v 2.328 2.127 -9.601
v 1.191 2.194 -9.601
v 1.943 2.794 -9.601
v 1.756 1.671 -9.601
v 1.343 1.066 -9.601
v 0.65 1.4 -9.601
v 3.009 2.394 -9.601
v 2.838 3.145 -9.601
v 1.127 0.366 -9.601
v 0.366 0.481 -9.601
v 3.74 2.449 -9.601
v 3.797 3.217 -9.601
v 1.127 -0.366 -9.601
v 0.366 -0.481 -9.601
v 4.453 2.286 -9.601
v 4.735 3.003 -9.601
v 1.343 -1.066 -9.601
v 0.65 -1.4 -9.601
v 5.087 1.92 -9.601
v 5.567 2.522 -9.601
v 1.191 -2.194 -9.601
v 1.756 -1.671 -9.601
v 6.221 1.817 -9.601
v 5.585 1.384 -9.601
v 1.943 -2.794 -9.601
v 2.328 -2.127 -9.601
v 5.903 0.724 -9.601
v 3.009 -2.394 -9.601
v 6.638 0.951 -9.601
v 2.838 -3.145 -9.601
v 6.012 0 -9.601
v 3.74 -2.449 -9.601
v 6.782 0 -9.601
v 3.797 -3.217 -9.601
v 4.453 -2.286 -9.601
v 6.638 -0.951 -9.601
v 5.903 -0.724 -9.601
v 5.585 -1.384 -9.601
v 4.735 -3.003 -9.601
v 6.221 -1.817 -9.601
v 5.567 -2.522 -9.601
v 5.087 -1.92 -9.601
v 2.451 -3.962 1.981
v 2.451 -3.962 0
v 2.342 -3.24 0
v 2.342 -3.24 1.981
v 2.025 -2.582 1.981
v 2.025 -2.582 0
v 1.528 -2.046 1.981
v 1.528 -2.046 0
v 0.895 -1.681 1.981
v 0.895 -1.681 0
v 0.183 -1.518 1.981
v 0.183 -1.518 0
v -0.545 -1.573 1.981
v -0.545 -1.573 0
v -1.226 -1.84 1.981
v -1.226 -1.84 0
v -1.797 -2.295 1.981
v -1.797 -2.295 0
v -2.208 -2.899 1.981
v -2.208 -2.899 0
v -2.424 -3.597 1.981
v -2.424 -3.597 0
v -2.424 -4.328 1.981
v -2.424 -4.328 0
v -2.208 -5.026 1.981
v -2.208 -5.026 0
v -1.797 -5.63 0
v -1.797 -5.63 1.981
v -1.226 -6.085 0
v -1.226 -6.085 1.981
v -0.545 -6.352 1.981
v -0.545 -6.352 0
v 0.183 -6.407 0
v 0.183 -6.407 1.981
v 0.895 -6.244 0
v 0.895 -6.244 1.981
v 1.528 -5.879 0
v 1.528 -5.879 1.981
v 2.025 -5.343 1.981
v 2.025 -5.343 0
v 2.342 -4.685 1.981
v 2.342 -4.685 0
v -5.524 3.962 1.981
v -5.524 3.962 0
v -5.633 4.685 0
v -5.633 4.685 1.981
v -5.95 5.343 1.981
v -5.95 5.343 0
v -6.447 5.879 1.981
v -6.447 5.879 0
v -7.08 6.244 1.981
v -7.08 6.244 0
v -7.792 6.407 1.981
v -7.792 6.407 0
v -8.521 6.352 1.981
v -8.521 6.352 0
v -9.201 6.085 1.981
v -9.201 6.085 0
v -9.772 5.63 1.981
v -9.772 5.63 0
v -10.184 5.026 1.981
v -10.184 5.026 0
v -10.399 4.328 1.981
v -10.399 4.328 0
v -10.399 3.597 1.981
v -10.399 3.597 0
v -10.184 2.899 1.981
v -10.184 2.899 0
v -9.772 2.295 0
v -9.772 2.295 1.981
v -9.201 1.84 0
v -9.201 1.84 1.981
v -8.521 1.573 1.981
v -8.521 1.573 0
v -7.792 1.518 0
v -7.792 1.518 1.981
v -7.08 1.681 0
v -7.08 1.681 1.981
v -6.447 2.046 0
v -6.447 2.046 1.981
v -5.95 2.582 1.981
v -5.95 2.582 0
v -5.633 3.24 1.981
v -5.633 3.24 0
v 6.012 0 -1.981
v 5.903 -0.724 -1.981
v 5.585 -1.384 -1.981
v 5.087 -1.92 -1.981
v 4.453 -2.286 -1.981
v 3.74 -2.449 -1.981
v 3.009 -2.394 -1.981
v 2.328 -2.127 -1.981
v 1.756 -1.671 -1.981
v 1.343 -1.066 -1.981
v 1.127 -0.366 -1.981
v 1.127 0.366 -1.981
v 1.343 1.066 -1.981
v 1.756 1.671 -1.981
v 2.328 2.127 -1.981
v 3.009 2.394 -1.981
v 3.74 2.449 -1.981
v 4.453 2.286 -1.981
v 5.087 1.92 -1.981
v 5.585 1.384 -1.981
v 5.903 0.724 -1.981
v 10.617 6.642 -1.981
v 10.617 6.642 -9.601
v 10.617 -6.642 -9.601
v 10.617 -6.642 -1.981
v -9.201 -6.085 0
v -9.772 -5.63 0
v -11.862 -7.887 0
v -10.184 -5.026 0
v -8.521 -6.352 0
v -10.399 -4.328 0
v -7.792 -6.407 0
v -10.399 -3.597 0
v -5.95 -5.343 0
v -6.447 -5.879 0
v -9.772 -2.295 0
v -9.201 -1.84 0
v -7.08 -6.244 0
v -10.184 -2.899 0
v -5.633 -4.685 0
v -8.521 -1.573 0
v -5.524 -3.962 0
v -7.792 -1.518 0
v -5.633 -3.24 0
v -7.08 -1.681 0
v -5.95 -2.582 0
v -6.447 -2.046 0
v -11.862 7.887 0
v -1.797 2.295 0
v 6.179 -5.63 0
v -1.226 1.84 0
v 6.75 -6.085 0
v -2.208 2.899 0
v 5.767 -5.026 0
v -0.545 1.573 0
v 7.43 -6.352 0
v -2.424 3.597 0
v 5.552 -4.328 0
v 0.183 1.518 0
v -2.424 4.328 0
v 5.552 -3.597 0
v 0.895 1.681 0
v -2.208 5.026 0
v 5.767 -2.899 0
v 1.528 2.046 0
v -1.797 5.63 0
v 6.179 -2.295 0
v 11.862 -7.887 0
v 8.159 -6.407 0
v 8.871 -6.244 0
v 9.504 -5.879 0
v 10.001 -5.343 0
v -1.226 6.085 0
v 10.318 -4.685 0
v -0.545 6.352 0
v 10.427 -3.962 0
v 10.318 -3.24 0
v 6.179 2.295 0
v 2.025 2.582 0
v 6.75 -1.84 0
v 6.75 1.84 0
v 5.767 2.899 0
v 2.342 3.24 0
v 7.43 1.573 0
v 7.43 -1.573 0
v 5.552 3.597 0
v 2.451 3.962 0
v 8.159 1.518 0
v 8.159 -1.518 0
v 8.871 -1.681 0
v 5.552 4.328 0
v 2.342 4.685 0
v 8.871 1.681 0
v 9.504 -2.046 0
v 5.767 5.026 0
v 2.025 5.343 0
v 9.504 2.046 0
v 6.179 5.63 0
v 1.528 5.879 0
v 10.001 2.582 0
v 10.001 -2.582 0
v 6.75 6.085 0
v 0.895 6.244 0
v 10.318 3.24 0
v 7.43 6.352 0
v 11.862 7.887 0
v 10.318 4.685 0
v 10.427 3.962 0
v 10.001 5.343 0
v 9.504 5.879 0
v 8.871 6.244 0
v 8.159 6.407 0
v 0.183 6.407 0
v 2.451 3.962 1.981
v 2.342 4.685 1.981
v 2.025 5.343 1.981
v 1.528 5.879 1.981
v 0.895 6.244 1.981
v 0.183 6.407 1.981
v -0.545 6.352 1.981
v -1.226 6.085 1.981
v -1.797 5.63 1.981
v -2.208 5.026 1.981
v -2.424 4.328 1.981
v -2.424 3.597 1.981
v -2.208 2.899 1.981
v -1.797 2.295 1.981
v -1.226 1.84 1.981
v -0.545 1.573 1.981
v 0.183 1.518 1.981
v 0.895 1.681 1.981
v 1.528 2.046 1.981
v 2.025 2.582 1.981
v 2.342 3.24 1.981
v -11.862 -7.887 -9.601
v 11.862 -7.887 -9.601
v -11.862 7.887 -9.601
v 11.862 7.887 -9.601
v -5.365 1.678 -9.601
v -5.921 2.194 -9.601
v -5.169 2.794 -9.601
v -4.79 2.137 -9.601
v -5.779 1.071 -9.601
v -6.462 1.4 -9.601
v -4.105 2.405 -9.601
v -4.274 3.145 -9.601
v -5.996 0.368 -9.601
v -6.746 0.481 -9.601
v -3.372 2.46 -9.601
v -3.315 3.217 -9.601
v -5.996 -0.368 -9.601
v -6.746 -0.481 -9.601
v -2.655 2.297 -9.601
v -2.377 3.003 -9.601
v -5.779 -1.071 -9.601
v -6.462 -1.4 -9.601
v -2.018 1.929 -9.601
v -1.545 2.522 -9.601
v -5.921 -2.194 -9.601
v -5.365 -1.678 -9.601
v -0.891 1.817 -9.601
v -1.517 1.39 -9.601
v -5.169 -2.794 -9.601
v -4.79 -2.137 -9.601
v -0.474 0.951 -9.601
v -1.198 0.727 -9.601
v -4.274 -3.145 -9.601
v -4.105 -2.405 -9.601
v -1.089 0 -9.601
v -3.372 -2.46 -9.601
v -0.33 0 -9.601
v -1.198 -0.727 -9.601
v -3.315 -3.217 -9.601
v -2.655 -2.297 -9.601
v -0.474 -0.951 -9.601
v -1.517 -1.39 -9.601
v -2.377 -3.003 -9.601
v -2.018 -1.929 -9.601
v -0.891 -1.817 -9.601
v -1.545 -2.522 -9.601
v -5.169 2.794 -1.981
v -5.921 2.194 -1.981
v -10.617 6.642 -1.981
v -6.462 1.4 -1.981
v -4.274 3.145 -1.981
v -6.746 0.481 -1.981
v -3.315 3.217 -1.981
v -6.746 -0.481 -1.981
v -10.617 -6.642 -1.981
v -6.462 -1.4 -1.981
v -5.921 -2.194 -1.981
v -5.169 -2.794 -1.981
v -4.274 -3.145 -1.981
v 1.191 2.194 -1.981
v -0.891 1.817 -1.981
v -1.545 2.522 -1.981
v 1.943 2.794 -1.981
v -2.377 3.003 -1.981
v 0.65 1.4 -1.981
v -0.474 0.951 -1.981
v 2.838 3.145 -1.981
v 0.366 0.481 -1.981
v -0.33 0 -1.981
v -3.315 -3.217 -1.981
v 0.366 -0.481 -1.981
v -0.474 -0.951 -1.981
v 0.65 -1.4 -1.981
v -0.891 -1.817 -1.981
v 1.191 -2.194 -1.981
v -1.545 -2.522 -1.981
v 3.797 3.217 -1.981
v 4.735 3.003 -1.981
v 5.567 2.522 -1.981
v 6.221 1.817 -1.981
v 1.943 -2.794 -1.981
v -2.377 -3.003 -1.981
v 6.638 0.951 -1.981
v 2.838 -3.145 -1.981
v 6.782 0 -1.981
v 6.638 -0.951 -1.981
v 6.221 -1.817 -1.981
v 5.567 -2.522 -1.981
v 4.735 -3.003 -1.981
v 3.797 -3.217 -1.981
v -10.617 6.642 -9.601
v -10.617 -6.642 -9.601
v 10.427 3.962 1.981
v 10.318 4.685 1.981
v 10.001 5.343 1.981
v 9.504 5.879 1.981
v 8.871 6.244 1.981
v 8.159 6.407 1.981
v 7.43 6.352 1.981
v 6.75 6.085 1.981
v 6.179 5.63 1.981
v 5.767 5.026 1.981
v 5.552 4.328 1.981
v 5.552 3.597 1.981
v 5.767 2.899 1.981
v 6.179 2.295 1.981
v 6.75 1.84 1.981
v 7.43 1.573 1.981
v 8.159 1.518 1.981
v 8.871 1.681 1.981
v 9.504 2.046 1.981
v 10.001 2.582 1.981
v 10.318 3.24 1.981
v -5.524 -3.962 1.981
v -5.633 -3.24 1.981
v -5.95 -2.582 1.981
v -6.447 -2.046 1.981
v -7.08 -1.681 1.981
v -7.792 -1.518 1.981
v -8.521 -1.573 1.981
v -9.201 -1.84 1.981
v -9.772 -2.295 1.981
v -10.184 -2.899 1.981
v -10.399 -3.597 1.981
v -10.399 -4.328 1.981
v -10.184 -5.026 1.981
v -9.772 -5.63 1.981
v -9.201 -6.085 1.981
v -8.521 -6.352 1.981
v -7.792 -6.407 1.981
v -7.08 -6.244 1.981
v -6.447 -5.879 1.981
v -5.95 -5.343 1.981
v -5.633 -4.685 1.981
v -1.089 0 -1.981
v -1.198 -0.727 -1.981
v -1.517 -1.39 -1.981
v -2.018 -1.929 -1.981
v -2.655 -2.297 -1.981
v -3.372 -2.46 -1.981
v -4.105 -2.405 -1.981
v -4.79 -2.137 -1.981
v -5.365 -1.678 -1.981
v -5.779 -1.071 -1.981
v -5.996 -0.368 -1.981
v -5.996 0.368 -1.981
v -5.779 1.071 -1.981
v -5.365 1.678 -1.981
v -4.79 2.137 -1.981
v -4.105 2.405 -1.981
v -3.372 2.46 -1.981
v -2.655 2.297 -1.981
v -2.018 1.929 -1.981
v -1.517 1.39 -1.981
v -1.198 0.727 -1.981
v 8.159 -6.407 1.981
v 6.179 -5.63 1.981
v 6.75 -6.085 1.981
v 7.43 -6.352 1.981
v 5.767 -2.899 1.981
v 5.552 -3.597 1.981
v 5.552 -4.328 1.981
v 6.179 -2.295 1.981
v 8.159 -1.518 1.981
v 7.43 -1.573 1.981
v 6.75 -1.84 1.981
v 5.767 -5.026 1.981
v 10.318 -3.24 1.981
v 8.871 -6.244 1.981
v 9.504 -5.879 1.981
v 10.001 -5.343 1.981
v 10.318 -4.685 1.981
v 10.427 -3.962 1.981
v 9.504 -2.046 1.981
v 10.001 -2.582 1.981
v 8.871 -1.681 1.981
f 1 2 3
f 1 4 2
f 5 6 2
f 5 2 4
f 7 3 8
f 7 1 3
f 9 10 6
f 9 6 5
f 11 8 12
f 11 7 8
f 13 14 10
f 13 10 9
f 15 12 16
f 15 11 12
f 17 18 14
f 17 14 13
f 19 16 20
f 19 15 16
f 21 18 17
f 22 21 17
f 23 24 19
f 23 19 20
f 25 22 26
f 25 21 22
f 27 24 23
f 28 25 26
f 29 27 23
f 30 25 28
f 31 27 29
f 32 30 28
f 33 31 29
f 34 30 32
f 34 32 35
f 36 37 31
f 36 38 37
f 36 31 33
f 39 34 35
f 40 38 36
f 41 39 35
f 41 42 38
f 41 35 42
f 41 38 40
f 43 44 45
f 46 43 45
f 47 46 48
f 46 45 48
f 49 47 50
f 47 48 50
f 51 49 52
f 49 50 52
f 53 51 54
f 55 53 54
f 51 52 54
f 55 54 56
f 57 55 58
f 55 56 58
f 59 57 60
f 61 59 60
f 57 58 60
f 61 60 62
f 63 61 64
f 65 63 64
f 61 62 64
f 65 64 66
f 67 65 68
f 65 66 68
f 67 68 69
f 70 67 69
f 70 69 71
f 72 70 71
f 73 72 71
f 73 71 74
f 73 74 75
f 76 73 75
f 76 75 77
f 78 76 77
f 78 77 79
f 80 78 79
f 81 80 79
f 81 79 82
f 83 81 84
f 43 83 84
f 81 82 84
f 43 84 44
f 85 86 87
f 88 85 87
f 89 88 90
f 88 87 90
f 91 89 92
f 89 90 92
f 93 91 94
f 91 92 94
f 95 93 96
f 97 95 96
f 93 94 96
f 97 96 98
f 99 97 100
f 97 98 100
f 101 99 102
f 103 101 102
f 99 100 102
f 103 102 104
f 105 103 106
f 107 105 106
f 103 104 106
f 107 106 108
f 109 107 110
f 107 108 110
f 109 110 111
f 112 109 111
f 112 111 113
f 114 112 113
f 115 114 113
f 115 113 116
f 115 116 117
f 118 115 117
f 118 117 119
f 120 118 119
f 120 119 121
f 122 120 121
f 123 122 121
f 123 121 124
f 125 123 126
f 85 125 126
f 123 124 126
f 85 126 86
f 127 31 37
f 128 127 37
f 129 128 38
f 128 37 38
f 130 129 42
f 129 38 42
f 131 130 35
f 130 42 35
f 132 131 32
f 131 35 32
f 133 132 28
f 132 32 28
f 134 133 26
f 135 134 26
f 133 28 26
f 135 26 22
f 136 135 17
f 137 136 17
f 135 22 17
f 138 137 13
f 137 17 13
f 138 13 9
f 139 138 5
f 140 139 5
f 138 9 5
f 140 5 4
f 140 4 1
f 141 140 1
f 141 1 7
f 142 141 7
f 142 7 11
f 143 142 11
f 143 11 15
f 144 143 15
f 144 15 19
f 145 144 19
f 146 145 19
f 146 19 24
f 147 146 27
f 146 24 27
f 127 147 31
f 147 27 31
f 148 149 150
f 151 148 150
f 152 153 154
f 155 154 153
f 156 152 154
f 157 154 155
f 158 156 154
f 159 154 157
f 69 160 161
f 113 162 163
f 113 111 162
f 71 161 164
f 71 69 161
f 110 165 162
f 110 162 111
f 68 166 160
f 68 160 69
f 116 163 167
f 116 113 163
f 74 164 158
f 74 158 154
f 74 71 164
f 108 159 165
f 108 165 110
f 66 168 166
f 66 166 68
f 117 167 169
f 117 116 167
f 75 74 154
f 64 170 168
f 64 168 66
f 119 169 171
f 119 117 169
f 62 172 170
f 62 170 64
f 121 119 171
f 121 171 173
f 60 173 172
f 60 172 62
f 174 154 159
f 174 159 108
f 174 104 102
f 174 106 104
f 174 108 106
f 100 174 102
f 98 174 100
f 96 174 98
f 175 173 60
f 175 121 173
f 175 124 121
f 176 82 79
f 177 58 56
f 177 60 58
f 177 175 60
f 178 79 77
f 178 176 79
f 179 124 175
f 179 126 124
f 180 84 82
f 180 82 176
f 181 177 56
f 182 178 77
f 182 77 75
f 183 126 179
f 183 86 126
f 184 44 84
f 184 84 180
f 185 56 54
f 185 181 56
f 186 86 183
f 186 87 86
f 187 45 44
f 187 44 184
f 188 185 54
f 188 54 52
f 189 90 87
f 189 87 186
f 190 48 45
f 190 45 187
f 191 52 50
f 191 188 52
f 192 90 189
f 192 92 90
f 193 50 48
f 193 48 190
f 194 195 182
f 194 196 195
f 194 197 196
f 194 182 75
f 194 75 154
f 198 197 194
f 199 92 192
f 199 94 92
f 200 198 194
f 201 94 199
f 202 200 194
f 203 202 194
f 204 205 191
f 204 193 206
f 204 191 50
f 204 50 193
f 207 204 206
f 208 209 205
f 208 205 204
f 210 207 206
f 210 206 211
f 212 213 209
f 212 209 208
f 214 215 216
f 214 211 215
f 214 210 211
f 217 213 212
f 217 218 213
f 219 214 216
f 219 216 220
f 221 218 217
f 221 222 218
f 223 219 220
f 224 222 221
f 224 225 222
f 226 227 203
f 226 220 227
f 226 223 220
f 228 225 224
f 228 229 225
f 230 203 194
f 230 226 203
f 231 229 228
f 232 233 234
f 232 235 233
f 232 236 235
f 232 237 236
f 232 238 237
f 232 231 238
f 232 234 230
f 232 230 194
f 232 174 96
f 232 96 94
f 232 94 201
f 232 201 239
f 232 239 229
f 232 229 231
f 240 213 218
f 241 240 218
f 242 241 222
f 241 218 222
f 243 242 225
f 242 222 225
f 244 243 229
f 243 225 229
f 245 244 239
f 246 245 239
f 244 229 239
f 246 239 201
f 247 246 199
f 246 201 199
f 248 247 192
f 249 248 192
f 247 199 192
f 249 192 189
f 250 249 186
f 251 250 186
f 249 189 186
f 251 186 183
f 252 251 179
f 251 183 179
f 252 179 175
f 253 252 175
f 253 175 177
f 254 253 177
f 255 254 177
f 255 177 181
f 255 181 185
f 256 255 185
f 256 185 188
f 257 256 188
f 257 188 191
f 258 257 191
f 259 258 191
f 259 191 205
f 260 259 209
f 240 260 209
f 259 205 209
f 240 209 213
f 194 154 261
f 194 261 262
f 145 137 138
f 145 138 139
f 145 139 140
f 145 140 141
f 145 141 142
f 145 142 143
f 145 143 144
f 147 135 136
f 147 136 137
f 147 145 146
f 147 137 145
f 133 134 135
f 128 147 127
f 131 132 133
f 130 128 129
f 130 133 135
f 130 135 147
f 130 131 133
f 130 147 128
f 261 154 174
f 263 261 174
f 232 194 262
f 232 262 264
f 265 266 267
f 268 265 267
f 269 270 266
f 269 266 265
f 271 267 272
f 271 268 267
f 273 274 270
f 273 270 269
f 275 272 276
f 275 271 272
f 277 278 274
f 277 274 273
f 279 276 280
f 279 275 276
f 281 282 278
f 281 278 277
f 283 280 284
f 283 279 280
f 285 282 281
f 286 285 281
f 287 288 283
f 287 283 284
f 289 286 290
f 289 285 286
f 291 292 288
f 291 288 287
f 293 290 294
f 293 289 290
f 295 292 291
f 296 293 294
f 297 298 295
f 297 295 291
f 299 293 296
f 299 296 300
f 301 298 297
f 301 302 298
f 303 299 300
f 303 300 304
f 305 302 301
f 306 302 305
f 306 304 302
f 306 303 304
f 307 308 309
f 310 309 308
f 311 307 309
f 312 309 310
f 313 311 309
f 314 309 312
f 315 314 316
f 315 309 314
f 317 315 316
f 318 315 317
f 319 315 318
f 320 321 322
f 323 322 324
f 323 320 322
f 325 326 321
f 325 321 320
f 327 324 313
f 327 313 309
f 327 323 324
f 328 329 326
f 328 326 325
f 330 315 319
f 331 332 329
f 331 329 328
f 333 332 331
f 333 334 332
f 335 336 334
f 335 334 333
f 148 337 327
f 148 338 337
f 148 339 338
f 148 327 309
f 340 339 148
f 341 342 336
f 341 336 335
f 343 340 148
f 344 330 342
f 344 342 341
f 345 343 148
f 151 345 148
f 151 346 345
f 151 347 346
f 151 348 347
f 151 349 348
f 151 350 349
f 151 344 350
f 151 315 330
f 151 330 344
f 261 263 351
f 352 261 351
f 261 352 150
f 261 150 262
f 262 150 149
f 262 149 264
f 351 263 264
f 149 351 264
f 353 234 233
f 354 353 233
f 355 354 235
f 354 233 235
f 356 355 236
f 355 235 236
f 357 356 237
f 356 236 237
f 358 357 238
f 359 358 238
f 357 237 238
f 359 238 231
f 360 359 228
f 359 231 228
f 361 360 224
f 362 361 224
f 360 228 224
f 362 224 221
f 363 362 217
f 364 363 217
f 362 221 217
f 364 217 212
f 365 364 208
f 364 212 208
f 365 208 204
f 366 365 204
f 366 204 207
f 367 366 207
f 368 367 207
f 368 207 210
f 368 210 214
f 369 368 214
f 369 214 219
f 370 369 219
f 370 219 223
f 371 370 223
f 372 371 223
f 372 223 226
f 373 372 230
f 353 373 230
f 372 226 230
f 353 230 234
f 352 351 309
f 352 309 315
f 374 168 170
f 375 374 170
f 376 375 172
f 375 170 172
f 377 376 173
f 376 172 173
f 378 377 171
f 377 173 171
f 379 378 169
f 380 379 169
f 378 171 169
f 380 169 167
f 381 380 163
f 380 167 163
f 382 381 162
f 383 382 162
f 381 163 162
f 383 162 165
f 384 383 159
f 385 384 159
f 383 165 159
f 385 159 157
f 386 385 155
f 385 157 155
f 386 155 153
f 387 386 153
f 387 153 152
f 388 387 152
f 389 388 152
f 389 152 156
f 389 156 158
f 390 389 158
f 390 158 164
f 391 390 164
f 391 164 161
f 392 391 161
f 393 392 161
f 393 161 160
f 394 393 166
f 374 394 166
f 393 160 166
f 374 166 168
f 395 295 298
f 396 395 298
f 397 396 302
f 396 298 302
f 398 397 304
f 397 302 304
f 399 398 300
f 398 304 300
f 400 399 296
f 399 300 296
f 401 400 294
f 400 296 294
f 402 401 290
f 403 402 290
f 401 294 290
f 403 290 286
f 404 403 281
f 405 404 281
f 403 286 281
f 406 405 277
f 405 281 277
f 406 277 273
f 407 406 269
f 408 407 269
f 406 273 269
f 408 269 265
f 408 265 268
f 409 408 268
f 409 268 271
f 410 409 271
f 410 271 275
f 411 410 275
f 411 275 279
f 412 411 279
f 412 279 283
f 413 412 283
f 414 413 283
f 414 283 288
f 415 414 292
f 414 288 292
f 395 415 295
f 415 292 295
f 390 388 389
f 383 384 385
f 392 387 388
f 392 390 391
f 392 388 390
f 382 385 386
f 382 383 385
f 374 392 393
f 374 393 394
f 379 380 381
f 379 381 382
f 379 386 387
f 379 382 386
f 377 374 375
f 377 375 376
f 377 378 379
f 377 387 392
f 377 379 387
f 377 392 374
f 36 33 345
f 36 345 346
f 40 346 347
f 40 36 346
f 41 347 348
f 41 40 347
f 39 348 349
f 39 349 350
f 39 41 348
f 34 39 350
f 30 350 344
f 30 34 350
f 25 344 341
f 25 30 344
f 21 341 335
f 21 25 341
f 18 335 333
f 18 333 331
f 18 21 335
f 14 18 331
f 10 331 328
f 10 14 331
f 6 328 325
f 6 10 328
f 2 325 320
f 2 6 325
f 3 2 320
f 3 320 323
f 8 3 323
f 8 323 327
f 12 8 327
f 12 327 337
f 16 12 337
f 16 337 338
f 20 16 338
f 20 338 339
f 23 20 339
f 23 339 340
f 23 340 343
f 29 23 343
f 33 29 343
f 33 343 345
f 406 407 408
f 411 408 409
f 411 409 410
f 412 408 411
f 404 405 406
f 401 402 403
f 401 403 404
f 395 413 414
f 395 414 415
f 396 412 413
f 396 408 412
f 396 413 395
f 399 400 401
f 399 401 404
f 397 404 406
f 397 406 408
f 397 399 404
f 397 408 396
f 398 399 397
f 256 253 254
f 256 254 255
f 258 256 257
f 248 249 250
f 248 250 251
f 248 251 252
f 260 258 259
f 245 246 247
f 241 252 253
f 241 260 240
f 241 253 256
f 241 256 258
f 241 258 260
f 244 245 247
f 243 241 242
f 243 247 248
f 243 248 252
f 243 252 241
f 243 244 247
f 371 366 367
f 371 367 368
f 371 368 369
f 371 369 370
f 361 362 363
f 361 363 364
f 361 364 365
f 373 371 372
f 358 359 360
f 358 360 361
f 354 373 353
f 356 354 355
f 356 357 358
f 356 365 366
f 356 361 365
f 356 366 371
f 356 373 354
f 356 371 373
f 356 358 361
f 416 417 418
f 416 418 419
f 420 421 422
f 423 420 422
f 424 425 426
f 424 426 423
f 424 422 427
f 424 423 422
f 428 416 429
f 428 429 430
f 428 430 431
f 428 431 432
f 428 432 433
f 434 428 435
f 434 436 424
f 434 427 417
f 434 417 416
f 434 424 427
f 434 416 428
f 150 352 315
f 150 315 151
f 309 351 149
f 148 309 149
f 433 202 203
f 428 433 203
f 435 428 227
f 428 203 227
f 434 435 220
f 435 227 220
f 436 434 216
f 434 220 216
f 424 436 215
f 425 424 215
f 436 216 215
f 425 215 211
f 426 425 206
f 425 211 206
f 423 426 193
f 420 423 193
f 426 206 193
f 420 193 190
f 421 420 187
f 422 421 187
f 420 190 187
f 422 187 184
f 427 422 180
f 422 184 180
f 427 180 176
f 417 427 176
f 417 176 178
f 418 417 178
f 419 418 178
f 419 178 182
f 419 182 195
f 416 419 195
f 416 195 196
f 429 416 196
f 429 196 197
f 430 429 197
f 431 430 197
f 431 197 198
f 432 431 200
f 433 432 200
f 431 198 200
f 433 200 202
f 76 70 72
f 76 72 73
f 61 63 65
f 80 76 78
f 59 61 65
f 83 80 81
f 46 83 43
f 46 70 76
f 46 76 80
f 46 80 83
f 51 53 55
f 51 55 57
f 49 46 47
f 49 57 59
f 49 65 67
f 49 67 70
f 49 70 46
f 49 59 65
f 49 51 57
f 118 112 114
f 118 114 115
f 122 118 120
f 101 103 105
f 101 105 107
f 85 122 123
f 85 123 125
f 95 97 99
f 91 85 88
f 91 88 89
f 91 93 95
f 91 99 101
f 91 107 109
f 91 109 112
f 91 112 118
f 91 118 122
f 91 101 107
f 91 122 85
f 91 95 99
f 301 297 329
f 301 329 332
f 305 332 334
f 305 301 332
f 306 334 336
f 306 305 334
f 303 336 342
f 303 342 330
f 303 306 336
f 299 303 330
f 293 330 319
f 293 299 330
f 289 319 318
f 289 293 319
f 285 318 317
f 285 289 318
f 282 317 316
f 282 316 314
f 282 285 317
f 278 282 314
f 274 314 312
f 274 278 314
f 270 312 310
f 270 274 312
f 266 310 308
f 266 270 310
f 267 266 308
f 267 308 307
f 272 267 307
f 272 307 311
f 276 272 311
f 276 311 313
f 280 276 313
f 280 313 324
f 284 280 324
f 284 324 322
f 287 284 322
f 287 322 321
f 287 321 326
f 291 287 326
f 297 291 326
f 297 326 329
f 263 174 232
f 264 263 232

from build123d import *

# Parameters (mm, degrees)
F0_W      = 23.7236
F0_H      = 15.7734
F2_DEPTH  = 9.6012
F1_R      = 2.4511
F3_DEPTH  = 1.9812
F4_W      = 21.2344
F4_H      = 13.2842
F6_DEPTH  = 7.62
F5_R      = 3.2258
F7_DEPTH  = 8.89
F8_R      = 2.467308
F9_R      = 2.45607
F10_DEPTH = 7.62


with BuildPart() as f2:
    # F0 (on Top) → F2 (new body)
    with BuildSketch(Plane.XY):
        Rectangle(F0_W, F0_H)
    extrude(amount=-F2_DEPTH)

    # F1 (on face) → F3 (join)
    with BuildSketch(Plane.XY):
        with Locations((-7.9756, 3.9624)):
            Circle(F1_R)
        with Locations((0, 3.9624)):
            Circle(F1_R)
        with Locations((7.9756, 3.9624)):
            Circle(F1_R)
        with Locations((7.9756, -3.9624)):
            Circle(F1_R)
        with Locations((0, -3.9624)):
            Circle(F1_R)
        with Locations((-7.9756, -3.9624)):
            Circle(F1_R)
    extrude(amount=F3_DEPTH)

    # F4 (on face) → F6 (cut)
    with BuildSketch(Plane(origin=(0, 0, -9.6012), x_dir=(1, 0, 0), z_dir=(0, 0, -1))):
        Rectangle(F4_W, F4_H)
    extrude(amount=-F6_DEPTH, mode=Mode.SUBTRACT)

    # F5 (on face) → F7 (join)
    with BuildSketch(Plane(origin=(0, 0, -9.6012), x_dir=(1, 0, 0), z_dir=(0, 0, -1))):
        with Locations((-3.556, 0)):
            Circle(F5_R)
        with Locations((3.556, 0)):
            Circle(F5_R)
    extrude(amount=-F7_DEPTH)

    # F8 (on face) + F9 (on face) → F10 (cut)
    with BuildSketch(Plane(origin=(0, 0, -9.6012), x_dir=(1, 0, 0), z_dir=(0, 0, -1))):
        with Locations((-3.556, 0)):
            Circle(F8_R)
    with BuildSketch(Plane(origin=(0, 0, -9.6012), x_dir=(1, 0, 0), z_dir=(0, 0, -1))):
        with Locations((3.556, 0)):
            Circle(F9_R)
    extrude(amount=-F10_DEPTH, mode=Mode.SUBTRACT)


solid = f2.part
